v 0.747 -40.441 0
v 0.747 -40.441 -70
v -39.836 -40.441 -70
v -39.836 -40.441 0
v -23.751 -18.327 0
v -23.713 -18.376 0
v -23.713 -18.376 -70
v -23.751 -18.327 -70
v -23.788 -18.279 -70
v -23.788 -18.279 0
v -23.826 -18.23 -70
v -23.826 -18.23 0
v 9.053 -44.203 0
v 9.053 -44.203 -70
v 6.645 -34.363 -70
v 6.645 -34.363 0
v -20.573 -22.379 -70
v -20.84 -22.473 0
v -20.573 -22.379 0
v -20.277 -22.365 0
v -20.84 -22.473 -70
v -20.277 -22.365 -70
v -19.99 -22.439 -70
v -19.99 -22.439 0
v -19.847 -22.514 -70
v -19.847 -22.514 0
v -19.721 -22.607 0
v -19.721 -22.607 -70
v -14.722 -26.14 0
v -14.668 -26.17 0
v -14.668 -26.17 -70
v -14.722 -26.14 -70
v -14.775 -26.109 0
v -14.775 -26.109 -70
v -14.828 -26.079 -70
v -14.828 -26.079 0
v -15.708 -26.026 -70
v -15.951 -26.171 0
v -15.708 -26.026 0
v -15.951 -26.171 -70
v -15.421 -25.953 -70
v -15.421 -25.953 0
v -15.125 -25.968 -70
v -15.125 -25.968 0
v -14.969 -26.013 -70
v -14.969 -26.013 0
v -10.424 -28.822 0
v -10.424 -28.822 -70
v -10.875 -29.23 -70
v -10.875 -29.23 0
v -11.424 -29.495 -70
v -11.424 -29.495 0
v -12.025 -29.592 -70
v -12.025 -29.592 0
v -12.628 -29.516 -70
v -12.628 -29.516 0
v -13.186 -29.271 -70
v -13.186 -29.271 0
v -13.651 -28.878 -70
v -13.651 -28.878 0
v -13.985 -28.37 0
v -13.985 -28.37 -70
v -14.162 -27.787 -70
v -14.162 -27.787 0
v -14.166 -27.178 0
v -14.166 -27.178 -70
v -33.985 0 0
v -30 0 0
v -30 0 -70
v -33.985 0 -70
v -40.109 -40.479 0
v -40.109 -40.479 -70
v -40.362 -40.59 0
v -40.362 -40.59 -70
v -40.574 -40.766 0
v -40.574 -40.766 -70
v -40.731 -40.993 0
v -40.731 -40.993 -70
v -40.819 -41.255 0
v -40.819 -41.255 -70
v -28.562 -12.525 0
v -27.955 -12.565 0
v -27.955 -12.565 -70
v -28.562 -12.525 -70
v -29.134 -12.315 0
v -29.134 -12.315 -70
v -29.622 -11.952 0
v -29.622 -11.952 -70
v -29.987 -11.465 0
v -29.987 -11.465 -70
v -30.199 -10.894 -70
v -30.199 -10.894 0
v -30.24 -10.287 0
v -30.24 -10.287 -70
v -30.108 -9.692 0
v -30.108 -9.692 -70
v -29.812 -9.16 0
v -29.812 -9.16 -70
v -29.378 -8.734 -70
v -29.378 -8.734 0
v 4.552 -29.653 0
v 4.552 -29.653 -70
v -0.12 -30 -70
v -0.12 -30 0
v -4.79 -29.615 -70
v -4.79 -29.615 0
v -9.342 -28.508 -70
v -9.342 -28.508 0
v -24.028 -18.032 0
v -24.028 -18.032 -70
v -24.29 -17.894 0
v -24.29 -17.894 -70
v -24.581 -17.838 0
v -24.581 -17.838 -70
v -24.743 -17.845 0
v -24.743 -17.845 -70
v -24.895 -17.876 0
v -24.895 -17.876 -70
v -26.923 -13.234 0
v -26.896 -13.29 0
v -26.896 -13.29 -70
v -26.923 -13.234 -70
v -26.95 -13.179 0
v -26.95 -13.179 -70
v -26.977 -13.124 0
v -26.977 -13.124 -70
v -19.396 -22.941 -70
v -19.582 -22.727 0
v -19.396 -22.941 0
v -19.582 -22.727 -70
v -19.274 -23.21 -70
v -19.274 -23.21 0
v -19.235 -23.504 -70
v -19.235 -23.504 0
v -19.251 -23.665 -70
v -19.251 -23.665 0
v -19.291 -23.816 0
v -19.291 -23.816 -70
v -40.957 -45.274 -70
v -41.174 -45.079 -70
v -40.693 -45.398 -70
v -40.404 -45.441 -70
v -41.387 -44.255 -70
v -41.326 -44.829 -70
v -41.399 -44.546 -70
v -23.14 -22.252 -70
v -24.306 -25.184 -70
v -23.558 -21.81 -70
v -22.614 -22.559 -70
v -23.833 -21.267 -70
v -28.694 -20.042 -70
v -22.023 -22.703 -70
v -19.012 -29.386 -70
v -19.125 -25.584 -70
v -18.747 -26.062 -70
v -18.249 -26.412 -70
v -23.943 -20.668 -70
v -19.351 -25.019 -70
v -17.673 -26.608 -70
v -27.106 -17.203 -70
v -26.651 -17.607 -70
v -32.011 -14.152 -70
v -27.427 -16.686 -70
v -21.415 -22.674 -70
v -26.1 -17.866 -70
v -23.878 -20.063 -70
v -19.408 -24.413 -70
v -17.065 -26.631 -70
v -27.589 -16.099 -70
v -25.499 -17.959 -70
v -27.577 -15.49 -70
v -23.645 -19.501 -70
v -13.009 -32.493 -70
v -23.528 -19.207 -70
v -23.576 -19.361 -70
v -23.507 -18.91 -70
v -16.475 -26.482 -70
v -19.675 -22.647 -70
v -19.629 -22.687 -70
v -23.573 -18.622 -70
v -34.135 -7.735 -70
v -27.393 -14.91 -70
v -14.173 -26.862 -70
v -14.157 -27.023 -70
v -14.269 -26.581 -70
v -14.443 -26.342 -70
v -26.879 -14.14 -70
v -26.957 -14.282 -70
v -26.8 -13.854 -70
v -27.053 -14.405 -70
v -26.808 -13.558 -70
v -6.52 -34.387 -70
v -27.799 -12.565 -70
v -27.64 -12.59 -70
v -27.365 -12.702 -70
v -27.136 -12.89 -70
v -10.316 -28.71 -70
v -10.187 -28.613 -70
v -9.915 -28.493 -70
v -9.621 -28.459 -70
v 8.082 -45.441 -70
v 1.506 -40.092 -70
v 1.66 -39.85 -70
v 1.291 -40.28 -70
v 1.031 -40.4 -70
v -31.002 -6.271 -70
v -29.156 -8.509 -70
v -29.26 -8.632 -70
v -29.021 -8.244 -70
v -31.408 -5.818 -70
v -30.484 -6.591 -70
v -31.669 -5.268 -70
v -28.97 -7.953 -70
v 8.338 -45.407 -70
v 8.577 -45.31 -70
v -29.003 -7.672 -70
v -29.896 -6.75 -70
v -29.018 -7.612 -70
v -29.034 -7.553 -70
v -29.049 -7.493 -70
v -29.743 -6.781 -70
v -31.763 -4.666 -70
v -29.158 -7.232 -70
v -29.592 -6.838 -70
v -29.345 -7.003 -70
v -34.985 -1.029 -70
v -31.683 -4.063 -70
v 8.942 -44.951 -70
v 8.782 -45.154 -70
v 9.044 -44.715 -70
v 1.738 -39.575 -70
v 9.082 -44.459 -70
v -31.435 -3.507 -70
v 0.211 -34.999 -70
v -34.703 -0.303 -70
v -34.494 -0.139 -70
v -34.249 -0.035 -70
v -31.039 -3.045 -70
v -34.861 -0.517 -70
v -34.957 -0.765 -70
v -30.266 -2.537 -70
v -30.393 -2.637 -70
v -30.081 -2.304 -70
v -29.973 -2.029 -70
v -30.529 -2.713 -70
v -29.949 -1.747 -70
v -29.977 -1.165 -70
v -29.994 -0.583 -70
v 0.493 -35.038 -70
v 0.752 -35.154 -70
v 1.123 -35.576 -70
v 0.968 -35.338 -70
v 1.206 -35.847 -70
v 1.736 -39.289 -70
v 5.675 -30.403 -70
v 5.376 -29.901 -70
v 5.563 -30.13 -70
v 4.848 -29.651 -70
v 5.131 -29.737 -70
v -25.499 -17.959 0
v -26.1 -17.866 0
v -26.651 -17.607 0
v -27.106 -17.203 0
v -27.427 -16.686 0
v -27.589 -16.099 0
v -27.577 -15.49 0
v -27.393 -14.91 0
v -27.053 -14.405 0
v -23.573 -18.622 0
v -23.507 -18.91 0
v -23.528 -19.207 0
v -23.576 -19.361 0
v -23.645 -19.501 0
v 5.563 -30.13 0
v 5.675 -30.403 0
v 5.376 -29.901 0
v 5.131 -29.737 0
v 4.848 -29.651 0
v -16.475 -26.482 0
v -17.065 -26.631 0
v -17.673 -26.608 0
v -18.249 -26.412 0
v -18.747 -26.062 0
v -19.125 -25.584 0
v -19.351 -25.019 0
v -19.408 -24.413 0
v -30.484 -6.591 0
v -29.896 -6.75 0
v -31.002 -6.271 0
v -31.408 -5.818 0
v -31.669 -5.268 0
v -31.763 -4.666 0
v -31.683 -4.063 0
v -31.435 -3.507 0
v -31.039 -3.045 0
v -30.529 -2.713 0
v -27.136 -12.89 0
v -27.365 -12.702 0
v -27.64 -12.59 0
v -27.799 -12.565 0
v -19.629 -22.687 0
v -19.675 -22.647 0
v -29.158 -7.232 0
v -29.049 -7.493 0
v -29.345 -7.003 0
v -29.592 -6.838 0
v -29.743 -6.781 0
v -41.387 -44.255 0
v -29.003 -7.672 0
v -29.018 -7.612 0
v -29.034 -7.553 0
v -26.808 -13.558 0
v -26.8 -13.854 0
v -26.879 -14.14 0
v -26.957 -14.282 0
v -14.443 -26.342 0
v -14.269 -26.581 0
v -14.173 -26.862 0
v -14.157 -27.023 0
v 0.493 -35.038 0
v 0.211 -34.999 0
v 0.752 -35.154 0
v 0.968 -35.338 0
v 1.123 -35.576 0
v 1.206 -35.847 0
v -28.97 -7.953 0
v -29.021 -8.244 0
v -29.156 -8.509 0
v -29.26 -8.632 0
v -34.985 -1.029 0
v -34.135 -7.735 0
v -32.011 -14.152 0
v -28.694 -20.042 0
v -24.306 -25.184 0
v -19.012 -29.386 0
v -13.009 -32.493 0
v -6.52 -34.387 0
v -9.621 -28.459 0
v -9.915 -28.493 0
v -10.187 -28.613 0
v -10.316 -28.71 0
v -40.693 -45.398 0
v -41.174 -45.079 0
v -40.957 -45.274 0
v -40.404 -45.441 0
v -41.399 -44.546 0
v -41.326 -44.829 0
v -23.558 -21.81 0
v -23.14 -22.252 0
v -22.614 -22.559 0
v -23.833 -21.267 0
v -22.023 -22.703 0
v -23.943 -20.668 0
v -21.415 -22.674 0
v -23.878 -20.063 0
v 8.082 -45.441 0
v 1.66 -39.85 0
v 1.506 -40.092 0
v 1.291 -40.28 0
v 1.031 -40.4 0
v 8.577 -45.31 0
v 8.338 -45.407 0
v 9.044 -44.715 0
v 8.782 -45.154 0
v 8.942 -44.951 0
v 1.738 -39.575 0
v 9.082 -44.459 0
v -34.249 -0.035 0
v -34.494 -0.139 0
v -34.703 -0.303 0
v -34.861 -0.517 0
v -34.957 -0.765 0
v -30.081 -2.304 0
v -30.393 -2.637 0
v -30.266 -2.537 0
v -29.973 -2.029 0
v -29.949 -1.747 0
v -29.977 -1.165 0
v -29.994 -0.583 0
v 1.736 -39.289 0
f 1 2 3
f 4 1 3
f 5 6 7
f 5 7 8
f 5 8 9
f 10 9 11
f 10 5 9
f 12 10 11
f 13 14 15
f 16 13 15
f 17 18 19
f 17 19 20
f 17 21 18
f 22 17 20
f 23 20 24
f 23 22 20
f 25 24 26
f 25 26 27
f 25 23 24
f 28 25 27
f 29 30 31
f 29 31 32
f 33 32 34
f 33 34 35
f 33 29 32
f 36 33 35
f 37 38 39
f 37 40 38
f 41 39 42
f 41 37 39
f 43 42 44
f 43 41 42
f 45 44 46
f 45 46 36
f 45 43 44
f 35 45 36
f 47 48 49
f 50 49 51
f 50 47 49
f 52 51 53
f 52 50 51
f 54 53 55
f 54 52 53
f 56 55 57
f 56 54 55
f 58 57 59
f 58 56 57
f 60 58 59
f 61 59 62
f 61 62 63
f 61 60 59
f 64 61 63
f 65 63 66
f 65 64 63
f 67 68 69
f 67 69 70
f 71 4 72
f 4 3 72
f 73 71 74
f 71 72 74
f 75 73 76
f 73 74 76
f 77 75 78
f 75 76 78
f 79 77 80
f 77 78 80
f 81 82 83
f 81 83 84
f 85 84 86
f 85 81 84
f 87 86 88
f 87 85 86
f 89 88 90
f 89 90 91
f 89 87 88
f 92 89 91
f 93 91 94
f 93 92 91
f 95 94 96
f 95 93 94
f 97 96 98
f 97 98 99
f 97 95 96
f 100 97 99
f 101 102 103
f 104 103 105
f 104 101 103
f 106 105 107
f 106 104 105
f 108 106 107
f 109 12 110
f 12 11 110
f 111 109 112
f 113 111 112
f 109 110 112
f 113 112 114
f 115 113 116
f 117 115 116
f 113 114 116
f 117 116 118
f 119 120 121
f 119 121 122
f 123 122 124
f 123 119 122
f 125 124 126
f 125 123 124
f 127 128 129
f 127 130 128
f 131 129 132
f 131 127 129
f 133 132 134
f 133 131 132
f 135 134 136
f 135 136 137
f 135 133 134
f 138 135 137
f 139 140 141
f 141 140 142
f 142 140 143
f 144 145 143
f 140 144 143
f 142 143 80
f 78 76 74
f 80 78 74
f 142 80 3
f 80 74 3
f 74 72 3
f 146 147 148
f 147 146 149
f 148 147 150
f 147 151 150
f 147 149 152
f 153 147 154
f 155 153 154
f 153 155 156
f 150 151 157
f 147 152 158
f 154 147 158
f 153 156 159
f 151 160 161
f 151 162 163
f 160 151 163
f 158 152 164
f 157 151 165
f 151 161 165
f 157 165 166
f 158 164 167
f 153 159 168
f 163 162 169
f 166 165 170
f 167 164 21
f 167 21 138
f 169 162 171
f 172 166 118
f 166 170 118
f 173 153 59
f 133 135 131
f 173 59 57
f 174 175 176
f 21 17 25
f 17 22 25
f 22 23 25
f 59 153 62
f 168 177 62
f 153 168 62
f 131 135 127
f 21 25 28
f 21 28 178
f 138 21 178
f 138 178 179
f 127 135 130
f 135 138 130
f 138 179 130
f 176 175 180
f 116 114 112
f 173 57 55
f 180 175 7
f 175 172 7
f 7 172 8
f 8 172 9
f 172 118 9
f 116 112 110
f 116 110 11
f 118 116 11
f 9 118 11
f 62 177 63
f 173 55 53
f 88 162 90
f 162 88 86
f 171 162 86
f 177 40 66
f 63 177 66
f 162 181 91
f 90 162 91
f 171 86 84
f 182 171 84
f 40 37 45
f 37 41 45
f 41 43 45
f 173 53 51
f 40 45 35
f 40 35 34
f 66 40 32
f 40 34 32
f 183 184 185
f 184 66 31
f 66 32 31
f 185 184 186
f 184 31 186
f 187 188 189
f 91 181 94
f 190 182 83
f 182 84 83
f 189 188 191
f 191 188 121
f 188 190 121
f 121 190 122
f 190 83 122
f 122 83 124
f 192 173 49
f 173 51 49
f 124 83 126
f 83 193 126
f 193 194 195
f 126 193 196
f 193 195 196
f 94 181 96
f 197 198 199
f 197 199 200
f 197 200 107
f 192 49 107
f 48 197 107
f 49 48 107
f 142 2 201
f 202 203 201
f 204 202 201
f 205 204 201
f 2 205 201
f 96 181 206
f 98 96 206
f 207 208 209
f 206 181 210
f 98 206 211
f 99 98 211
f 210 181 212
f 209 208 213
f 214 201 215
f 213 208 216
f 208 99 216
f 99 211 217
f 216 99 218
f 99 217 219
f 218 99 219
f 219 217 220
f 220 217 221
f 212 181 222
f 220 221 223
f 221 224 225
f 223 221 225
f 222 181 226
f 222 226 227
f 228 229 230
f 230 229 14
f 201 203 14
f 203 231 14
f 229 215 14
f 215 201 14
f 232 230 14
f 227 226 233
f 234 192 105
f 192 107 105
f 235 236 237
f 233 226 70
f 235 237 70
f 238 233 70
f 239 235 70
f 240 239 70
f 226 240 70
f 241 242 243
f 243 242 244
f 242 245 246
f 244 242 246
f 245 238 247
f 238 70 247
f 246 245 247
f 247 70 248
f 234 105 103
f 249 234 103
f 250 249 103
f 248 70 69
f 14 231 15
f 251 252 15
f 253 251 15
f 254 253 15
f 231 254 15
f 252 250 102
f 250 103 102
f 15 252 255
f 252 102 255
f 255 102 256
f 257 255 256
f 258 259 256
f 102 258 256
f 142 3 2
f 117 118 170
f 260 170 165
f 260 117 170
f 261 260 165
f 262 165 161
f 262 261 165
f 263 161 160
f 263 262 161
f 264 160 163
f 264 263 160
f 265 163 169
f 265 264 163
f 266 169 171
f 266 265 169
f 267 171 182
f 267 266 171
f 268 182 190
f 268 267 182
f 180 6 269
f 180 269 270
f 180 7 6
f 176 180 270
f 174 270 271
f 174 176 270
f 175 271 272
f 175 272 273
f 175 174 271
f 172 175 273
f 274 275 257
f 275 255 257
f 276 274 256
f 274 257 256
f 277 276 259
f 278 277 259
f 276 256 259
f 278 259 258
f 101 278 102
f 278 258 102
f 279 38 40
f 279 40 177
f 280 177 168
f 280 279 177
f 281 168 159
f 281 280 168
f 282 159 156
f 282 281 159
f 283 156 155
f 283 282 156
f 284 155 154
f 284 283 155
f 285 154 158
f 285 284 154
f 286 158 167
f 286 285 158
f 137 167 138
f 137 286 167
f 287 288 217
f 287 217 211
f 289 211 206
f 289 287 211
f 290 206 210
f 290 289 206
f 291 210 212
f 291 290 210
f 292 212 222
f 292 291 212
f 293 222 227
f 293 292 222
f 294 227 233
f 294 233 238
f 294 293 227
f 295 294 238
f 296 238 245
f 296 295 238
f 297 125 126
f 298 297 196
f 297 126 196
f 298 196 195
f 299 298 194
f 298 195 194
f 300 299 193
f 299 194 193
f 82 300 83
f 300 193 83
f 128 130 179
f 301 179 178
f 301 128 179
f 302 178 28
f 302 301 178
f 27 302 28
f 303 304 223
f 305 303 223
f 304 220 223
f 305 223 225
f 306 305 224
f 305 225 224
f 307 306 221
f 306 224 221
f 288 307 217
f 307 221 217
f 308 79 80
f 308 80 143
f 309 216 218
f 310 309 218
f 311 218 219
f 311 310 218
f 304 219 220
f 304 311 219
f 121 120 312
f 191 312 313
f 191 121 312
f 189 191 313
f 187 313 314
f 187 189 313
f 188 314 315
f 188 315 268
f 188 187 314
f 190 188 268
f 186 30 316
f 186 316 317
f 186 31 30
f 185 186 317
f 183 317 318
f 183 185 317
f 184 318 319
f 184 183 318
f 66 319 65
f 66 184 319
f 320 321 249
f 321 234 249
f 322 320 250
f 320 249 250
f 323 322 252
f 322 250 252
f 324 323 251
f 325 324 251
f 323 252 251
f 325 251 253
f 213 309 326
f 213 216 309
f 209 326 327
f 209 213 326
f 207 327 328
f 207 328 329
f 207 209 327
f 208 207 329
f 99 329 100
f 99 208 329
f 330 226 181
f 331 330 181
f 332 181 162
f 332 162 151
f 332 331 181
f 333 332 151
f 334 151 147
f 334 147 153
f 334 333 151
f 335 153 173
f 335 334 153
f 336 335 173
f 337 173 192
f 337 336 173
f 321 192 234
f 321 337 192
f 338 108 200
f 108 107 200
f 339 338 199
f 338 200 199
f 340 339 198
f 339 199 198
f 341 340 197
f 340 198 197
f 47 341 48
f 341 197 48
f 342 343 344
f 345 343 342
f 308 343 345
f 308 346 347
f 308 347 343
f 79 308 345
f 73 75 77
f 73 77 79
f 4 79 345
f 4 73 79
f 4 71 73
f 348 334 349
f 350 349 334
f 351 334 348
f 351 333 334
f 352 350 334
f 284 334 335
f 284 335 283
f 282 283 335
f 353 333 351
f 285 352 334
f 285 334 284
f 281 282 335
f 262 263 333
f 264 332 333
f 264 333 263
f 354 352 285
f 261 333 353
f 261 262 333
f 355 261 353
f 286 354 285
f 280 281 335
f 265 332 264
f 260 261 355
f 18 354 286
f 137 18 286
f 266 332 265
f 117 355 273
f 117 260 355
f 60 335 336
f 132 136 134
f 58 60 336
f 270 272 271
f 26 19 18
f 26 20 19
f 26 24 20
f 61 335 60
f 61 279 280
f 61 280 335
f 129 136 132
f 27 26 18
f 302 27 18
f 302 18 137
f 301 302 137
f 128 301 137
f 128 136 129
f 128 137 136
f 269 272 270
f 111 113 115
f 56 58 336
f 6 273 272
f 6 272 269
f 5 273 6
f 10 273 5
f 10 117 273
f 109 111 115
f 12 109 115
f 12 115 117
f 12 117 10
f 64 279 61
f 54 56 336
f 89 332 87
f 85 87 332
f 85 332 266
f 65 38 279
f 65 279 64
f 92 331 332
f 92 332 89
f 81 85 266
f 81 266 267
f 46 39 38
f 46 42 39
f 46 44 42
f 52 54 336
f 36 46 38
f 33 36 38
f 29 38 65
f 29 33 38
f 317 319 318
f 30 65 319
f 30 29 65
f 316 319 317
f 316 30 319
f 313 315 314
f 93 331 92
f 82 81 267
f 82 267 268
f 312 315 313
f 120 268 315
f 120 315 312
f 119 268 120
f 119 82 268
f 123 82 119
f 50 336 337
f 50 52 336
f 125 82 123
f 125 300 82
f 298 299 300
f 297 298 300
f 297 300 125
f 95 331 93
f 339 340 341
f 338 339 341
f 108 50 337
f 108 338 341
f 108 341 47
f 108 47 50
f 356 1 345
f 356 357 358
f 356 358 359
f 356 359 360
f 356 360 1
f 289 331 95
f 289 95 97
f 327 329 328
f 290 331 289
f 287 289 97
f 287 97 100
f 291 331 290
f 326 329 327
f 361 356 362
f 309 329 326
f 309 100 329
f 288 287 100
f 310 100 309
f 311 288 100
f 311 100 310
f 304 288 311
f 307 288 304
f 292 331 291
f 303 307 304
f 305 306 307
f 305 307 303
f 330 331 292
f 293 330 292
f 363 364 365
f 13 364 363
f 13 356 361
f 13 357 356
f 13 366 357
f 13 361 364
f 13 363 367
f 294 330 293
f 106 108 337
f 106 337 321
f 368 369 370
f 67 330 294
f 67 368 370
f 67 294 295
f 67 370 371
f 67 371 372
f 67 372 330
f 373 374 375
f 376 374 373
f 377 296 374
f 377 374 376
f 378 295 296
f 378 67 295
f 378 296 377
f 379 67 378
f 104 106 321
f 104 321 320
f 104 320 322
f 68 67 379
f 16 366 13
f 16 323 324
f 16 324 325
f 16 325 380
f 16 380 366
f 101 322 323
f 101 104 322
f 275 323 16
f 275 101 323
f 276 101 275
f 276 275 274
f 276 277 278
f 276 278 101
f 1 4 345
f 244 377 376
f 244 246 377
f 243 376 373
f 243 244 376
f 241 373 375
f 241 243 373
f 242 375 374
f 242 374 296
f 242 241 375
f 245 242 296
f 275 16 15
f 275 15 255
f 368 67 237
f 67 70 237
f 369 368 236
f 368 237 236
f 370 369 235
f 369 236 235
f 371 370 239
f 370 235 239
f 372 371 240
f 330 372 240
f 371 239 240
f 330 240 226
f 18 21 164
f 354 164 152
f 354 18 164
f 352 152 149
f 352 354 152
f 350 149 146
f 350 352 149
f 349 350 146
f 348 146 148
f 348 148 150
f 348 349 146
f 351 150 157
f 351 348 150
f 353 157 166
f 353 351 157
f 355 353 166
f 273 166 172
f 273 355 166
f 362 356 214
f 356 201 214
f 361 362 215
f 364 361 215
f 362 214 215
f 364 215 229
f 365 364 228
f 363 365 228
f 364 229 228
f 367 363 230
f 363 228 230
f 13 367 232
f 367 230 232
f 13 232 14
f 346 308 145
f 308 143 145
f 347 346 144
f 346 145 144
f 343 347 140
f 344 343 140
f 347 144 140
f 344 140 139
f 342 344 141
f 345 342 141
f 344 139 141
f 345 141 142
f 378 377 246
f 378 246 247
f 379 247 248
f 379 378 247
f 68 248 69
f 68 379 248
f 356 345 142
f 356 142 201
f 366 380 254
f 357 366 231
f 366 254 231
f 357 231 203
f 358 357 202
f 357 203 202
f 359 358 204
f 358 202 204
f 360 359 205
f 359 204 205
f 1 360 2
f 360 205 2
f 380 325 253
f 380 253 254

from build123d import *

# Parameters (mm, degrees)
BOSS_EXTRUDE1_DEPTH = 70
FILLET1_R           = 1
FILLET2_R           = 1
FILLET3_R           = 1
FILLET4_R           = 1
FILLET5_R           = 1


with BuildPart() as part:
    # Sketch1 → Boss-Extrude1 (new body)
    with BuildSketch(Plane.XY):
        with BuildLine():
            Line((-30, 0), (-35, 0))
            ThreePointArc((-35, 0), (-24.366509464, -25.125151075), (1.07275523, -34.983556083))
            Line((1.07275523, -34.983556083), (1.913239039, -40.440769755))
            Line((1.913239039, -40.440769755), (-40.664590355, -40.440769755))
            Line((-40.664590355, -40.440769755), (-41.611505919, -45.440769755))
            Line((-41.611505919, -45.440769755), (9.356298233, -45.440769755))
            Line((9.356298233, -45.440769755), (6.644574503, -34.363492687))
            Line((6.644574503, -34.363492687), (5.454004631, -29.500064974))
            ThreePointArc((5.454004631, -29.500064974), (-2.399349656, -29.903898094), (-10.087846616, -28.253059138))
            ThreePointArc((-10.087846616, -28.253059138), (-12.915959233, -29.413373854), (-13.975418711, -26.545953964))
            ThreePointArc((-13.975418711, -26.545953964), (-14.748247142, -26.124494373), (-15.508377464, -25.680541825))
            ThreePointArc((-15.508377464, -25.680541825), (-18.510827542, -26.254862942), (-18.978488477, -23.233961675))
            ThreePointArc((-18.978488477, -23.233961675), (-19.65199094, -22.66714036), (-20.308573214, -22.080802839))
            ThreePointArc((-20.308573214, -22.080802839), (-23.365262749, -22.046157513), (-23.222418703, -18.99261092))
            ThreePointArc((-23.222418703, -18.99261092), (-23.7696551, -18.303100733), (-24.296426035, -17.59783174))
            ThreePointArc((-24.296426035, -17.59783174), (-27.285087446, -16.955605782), (-26.537452182, -13.991555728))
            ThreePointArc((-26.537452182, -13.991555728), (-26.936533055, -13.206937077), (-27.312421814, -12.410947371))
            ThreePointArc((-27.312421814, -12.410947371), (-30.113508646, -11.186829821), (-28.790987573, -8.430838306))
            ThreePointArc((-28.790987573, -8.430838306), (-29.025949689, -7.582495937), (-29.235920721, -6.727625107))
            ThreePointArc((-29.235920721, -6.727625107), (-31.737389499, -4.970580666), (-29.892883462, -2.532887353))
            ThreePointArc((-29.892883462, -2.532887353), (-29.973208903, -1.267575668), (-30, 0))
        make_face()
    extrude(amount=-BOSS_EXTRUDE1_DEPTH)

    # Fillet1
    fillet1_edges = [part.edges().sort_by_distance(p)[0] for p in [
        (5.454004631, -29.500064974, -35),
        (9.356298233, -45.440769755, -35),
        (-41.611505919, -45.440769755, -35),
        (-40.664590355, -40.440769755, -35),
        (1.913239039, -40.440769755, -35),
        (1.07275523, -34.983556083, -35),
        (-35, 0, -35),
    ]]
    fillet(fillet1_edges, radius=FILLET1_R)

    # Fillet2
    fillet2_edges = [part.edges().sort_by_distance(p)[0] for p in [
        (-29.892883462, -2.532887353, -35),
        (-28.790987573, -8.430838306, -35),
        (-26.537452182, -13.991555728, -35),
        (-23.222418703, -18.99261092, -35),
        (-18.978488477, -23.233961675, -35),
        (-13.975418711, -26.545953964, -35),
    ]]
    fillet(fillet2_edges, radius=FILLET2_R)

    # Fillet3
    fillet3_edges = [part.edges().sort_by_distance(p)[0] for p in [
        (-20.308573214, -22.080802839, -35),
        (-15.508377464, -25.680541825, -35),
        (-10.087846616, -28.253059138, -35),
    ]]
    fillet(fillet3_edges, radius=FILLET3_R)

    # Fillet4
    fillet4_edges = [part.edges().sort_by_distance(p)[0] for p in [
        (-27.312421814, -12.410947371, -35),
        (-24.296426035, -17.59783174, -35),
    ]]
    fillet(fillet4_edges, radius=FILLET4_R)

    # Fillet5
    fillet5_edges = [part.edges().sort_by_distance(p)[0] for p in [
        (-29.235920721, -6.727625107, -35),
    ]]
    fillet(fillet5_edges, radius=FILLET5_R)


solid = part.part
